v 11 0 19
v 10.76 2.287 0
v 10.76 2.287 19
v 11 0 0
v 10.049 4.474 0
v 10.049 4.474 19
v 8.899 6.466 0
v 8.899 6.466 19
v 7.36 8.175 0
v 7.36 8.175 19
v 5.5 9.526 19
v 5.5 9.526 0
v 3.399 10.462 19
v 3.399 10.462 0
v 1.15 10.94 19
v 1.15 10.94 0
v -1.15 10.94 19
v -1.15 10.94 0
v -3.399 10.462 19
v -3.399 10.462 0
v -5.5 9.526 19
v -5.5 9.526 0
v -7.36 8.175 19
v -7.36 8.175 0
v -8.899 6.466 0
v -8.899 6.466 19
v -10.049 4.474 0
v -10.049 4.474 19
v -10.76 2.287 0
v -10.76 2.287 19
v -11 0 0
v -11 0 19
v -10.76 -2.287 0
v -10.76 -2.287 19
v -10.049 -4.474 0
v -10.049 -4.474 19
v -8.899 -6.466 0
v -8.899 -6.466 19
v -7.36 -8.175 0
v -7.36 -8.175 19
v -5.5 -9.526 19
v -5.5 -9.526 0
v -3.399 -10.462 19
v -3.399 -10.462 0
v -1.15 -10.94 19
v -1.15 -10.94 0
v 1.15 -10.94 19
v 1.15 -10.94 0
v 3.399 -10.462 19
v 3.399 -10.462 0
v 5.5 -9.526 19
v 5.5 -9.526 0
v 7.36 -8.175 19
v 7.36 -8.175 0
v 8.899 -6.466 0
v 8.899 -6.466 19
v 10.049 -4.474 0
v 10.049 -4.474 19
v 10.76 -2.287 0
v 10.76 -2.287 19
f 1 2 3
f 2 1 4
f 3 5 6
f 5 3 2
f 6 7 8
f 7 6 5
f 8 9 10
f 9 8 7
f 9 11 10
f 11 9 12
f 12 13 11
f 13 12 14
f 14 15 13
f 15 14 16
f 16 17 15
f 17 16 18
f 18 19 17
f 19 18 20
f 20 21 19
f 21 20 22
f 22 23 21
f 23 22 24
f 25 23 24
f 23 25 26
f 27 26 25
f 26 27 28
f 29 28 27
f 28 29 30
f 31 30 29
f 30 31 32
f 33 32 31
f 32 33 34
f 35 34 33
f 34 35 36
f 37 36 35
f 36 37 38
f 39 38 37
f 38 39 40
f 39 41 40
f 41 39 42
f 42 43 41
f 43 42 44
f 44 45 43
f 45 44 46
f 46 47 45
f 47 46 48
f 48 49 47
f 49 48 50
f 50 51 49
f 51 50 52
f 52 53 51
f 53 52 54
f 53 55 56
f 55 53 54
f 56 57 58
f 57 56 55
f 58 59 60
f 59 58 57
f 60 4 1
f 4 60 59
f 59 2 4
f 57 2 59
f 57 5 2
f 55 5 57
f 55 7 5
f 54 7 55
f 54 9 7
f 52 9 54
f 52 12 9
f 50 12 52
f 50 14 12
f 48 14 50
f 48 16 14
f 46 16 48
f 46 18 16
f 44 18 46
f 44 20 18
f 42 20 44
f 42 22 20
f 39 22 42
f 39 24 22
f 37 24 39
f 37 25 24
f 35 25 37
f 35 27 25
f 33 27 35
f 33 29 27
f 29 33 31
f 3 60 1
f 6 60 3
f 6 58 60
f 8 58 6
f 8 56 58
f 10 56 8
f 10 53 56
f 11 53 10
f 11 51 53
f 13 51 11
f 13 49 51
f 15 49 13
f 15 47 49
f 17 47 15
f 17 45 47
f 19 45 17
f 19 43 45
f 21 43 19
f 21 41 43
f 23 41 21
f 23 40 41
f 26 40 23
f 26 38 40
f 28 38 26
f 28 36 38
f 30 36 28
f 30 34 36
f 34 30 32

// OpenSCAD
// Generated by SolidPython 1.0.1 on 2020-07-29 00:46:45


cylinder(h = 19, r1 = 11, r2 = 11);
/***********************************************
*********      SolidPython code:      **********
************************************************
 
# import packages: SolidPython
from solid import *
from solid.utils import *
from itertools import chain, combinations, permutations


class Resize:

    def __init__(self, scad_file):
        self.scad_file = scad_file
        #self.scad_file = import_scad(scad_file)
        # cone/cylinder param:
        self.r1 = 0
        self.r2 = 0
        self.h = 0
        # rectangular prism param:
        self.w = 0
        self.l = 0
        # ellipse param:
        self.r = 0

    # import OpenScad code (file name corresponds to shape)


    # classify shape + parameters
    def assign(self, param1, param2, param3):
        if self.scad_file == 'cone.scad':
            self.r1 = param1
            self.r2 = param2
            self.h = param3
        elif self.scad_file == 'cylinder.scad':
            self.r1 = param1
            self.r2 = param2
            self.h = param3
        elif self.scad_file == 'rectangularPrism.scad':
            self.h = param1
            self.l = param2
            self.w = param3
        else:
            self.r = param1
            self.h = param2

    # resize parameters
    def iterate(self):
        x = range(3, 20, 2)
        i = 1
        if self.scad_file == 'cone.scad':
            tempList = list(permutations(x, 2))
            for temp in tempList:
                param1 = temp[0]
                param2 = temp[1]
                filepath = 'produced_scad_files/' + 'cone' + str(param1) + '_' + str(param2) + '_' + '.scad'
                scad_render_to_file(cylinder(h=param1, r1=param2, r2=0), filepath)

        elif self.scad_file == 'cylinder.scad':
            tempList = list(permutations(x, 3))
            for temp in tempList:
                param1 = temp[0]
                param2 = temp[1]
                filepath = 'produced_scad_files/' + 'cylinder' + str(param1) + '_' + str(param2) + '_' + '.scad'
                scad_render_to_file(cylinder(h=param1, r1=param2, r2=param2), filepath)

        elif self.scad_file == 'rectangularPrism.scad':
            tempList = list(permutations(x, 3))
            for temp in tempList:
                param1 = temp[0]
                param2 = temp[1]
                param3 = temp[2]
                filepath = 'produced_scad_files/' + 'rectangularPrism' + str(param1) + '_' + str(param2) + '_' + str(
                    param3) + '.scad'
                scad_render_to_file(cube(size=(param1, param2, param3)), filepath)

        elif self.scad_file == 'ellipse.scad':
            tempList = list(permutations(x, 4))
            for temp in tempList:
                param1 = temp[0]
                param2 = temp[1]
                param3 = temp[2]
                param4 = temp[3]
                filepath = 'produced_scad_files/' + 'ellipse' + str(param1) + '_' + str(param2) + '_' + str(param3) + '_' + str(param4) + '.scad'
                scad_render_to_file(scale([param1, param2, param3])(sphere(r=param4)), filepath)

    def render_to_scadfile(self):
        scad_render_to_file(scad, 'example.scad') 
 
************************************************/
